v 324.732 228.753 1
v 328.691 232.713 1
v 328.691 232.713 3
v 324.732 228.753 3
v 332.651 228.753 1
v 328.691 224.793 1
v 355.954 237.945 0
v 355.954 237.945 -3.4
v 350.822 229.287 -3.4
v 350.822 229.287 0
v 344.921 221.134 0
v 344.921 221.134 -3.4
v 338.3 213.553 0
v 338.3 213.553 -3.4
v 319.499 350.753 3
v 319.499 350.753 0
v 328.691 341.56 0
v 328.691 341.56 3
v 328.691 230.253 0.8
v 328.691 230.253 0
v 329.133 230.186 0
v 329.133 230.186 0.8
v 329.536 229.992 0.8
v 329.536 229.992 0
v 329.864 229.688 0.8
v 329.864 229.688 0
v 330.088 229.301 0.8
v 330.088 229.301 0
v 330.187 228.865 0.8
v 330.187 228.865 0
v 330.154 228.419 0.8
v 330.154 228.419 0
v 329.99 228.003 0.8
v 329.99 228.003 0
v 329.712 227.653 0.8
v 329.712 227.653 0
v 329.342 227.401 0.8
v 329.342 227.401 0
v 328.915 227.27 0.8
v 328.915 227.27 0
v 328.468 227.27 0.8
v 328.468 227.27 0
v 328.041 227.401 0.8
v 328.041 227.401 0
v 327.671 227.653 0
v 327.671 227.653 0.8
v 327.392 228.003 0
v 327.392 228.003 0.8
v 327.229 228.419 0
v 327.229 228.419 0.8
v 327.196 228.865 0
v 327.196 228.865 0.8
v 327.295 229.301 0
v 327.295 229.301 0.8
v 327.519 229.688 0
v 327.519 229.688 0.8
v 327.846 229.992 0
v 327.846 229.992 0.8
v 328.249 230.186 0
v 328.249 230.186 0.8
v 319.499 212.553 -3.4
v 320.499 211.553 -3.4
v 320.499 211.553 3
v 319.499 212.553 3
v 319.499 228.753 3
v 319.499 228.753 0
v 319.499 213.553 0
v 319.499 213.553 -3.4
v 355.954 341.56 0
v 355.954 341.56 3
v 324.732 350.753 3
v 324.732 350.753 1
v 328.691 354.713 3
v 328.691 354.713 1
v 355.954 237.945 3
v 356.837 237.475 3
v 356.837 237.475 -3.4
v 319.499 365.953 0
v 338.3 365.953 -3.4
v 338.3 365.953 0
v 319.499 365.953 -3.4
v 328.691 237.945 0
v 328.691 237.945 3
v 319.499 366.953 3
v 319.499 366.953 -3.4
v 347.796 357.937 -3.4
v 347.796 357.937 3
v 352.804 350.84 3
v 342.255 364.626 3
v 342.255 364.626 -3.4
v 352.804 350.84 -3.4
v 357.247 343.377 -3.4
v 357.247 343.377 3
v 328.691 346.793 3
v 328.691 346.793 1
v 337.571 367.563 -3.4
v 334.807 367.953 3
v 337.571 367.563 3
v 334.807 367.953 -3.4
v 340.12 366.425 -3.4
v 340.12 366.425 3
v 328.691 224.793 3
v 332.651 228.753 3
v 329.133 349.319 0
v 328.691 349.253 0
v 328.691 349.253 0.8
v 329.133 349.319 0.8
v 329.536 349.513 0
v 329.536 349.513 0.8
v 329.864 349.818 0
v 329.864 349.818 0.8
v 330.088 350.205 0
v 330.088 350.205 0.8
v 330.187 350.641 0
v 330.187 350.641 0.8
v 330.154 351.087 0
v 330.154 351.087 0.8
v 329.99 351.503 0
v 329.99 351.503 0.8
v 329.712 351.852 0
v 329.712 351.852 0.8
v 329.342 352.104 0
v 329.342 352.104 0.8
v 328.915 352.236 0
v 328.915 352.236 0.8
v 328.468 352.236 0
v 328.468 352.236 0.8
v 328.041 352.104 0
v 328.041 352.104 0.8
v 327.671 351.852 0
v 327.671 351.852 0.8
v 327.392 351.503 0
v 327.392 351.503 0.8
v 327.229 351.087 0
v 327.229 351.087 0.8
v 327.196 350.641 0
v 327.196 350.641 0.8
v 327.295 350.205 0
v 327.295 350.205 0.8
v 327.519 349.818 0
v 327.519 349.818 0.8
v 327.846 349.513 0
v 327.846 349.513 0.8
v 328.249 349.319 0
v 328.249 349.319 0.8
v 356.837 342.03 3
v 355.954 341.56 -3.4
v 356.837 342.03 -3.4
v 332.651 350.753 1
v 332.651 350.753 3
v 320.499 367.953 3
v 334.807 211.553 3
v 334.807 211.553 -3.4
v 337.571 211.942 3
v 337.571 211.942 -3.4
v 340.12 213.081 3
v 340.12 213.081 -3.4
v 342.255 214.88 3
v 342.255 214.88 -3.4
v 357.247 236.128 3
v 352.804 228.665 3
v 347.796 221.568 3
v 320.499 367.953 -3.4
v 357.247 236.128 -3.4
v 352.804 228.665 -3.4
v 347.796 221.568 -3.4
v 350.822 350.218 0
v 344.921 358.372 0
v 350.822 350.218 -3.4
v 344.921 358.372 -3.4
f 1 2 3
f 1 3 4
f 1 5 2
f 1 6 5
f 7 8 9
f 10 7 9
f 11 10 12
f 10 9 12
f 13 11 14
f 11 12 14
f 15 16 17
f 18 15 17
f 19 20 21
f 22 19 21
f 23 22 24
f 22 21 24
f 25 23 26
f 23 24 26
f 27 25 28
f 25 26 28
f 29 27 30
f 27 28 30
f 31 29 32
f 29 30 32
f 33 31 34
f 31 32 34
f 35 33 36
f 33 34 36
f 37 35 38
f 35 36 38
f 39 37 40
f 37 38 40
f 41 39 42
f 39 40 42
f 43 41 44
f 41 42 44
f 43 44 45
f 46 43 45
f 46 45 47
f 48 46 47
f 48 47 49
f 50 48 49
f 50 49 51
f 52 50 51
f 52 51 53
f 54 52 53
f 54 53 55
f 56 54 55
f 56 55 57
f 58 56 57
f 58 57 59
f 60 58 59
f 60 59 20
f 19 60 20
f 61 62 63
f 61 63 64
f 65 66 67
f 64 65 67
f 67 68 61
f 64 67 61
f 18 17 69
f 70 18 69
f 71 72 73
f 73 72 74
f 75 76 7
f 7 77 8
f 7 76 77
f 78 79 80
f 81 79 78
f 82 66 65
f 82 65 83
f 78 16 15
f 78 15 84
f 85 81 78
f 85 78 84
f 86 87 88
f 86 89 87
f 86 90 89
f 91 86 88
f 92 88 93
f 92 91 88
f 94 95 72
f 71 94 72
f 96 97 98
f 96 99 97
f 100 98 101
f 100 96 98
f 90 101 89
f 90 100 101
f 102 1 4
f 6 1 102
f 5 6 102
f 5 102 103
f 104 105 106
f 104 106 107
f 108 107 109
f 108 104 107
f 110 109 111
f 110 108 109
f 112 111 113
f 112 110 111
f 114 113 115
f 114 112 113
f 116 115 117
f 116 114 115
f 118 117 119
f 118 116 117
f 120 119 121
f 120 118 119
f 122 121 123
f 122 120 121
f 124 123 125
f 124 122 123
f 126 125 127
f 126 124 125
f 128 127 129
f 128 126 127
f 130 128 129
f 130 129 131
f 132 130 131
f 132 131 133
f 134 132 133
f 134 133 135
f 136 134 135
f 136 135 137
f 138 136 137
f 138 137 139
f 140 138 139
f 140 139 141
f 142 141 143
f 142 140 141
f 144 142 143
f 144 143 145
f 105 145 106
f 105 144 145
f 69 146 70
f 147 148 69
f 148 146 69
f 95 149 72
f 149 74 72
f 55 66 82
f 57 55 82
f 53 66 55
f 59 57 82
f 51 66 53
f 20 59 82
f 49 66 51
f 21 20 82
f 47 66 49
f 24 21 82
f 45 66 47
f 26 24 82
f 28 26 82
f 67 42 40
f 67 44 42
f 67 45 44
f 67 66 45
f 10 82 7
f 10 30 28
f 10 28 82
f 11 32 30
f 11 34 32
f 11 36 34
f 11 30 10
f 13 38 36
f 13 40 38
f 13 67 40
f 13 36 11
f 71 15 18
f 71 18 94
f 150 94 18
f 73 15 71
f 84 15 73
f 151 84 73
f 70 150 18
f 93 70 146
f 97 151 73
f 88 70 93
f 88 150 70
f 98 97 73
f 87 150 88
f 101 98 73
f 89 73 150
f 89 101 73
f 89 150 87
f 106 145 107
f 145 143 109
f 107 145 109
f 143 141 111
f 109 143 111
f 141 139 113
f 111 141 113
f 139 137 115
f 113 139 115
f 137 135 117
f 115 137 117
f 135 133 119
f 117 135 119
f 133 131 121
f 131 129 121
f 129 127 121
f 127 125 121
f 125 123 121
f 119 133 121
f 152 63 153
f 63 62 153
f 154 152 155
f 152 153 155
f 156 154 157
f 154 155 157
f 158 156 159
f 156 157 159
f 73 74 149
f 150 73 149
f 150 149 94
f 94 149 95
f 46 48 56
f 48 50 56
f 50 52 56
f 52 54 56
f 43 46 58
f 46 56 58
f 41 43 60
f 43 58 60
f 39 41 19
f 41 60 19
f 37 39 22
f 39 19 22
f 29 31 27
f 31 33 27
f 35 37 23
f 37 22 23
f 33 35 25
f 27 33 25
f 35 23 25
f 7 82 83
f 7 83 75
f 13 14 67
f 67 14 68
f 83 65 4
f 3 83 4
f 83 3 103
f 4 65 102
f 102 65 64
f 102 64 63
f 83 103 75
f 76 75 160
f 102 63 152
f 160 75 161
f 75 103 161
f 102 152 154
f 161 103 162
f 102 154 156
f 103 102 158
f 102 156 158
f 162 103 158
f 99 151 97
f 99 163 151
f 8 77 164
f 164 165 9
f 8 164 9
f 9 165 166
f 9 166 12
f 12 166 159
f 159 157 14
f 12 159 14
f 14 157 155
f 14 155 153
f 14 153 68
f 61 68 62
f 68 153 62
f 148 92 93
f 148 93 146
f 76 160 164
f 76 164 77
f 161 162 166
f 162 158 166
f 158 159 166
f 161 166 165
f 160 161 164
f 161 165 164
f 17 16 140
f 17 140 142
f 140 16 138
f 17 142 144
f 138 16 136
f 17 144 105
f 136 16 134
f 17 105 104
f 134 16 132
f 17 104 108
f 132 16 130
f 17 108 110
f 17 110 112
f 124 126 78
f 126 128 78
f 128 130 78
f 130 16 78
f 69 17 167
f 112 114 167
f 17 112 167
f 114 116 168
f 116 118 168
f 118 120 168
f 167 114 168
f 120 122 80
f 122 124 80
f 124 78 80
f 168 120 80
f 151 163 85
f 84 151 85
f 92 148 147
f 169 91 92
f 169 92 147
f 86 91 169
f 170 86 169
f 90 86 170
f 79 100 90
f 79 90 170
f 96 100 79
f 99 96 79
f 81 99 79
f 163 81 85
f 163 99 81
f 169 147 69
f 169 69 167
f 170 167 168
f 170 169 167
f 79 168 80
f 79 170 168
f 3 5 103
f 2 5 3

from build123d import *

# Parameters (mm, degrees)
SKETCH1_R           = 1.5
BOSS_EXTRUDE1_DEPTH = 3
BOSS_EXTRUDE2_START = 3.4
BOSS_EXTRUDE2_DEPTH = 3.4
CUT_EXTRUDE1_START  = -2
CUT_EXTRUDE1_DEPTH  = 2
FILLET1_R           = 10
CHAMFER1_SIZE       = 1
BOSS_EXTRUDE3_START = -0.2
SKETCH4_R           = 1.5
BOSS_EXTRUDE3_DEPTH = 0.2


with BuildPart() as part:
    # Sketch1 → Boss-Extrude1 (new body)
    with BuildSketch(Plane.XY):
        with BuildLine():
            Line((328.691338583, 341.56036775), (355.953928282, 341.56036775))
            Line((355.953928282, 341.56036775), (357.719129547, 342.500614789))
            ThreePointArc((357.719129547, 342.500614789), (349.332397931, 355.881708416), (339.150023633, 367.952755906))
            Line((339.150023633, 367.952755906), (319.498950427, 367.952755906))
            Line((319.498950427, 367.952755906), (319.498950427, 350.752755906))
            Line((319.498950427, 350.752755906), (328.691338583, 341.56036775))
        make_face()
        with Locations(Location((328.691338583, 350.752755906, 0), (0, 0, 270))):
            Circle(SKETCH1_R, mode=Mode.SUBTRACT)
    extrude(amount=BOSS_EXTRUDE1_DEPTH)

    # Sketch2 → Boss-Extrude2 (add)
    with BuildSketch(Plane(origin=(0, 0, 0), x_dir=(-1, 0, 0), z_dir=(0, 0, -1)).offset(BOSS_EXTRUDE2_START)):
        with BuildLine():
            Line((-319.498950427, 367.952755906), (-339.150023633, 367.952755906))
            ThreePointArc((-339.150023633, 367.952755906), (-349.332397931, 355.881708416), (-357.719129547, 342.500614789))
            Line((-357.719129547, 342.500614789), (-355.953928282, 341.56036775))
            ThreePointArc((-355.953928282, 341.56036775), (-347.964183921, 354.362345636), (-338.300383295, 365.952755906))
            Line((-338.300383295, 365.952755906), (-319.498950427, 365.952755906))
            Line((-319.498950427, 365.952755906), (-319.498950427, 367.952755906))
        make_face()
    extrude(amount=-BOSS_EXTRUDE2_DEPTH)

    # Sketch3 → Cut-Extrude1 (cut)
    with BuildSketch(Plane.XY.offset(3).offset(CUT_EXTRUDE1_START)):
        Polygon((332.651136557, 350.752755906), (328.691338583, 346.792957931), (324.731540608, 350.752755906), (328.691338583, 354.71255388), align=None)
    extrude(amount=CUT_EXTRUDE1_DEPTH, mode=Mode.SUBTRACT)

    # Fillet1
    fillet1_edges = [part.edges().sort_by_distance(p)[0] for p in [
        (339.150023633, 367.952755906, -0.2),
    ]]
    fillet(fillet1_edges, radius=FILLET1_R)

    # Chamfer1
    # the kernel refuses this chamfer: 1 mm, written as the material it takes off along each edge
    with BuildSketch(Plane(origin=(319.498950427, 367.952755906, 5.571682988), x_dir=(1, 0, 0), z_dir=(0, 0, -1))) as chamfer1_piece_1:
        Polygon((CHAMFER1_SIZE, 0), (0, CHAMFER1_SIZE), (0, 0), align=None)
    extrude(amount=11.543365976, mode=Mode.SUBTRACT)
    with BuildSketch(Plane(origin=(357.719129547, 342.500614789, -5.971682988), x_dir=(-0.4740347155917083, 0.8805061546712143, 7.820465649921131e-15), z_dir=(0, 0, 1))) as chamfer1_piece_2:
        with BuildLine():
            Line((0.995592665, 0), (CHAMFER1_SIZE * 0.00443668745667, CHAMFER1_SIZE * 0.999990157854))
            Line((CHAMFER1_SIZE * 0.00443668745667, CHAMFER1_SIZE * 0.999990157854), (0, 0))
            ThreePointArc((0, 0), (0.511873941, -0.001103406), (0.995592665, 0))
        make_face()
    extrude(amount=11.543365976, mode=Mode.SUBTRACT)


with BuildPart() as body_2:
    # Mirror2: mirrored copy
    add(part.part.mirror(Plane.ZX.offset(289.752755906)))


with BuildPart() as part_1:
    add(part.part)

    add(body_2.part)  # Boss-Extrude3 merges body 2
    # Sketch4 → Boss-Extrude3 (add)
    with BuildSketch(Plane.XY.offset(1).offset(BOSS_EXTRUDE3_START)):
        with Locations((328.691338583, 350.752755906)):
            Circle(SKETCH4_R)
        with Locations((328.691338583, 228.752755906)):
            Circle(SKETCH4_R)
    extrude(amount=BOSS_EXTRUDE3_DEPTH)


solid = part_1.part
